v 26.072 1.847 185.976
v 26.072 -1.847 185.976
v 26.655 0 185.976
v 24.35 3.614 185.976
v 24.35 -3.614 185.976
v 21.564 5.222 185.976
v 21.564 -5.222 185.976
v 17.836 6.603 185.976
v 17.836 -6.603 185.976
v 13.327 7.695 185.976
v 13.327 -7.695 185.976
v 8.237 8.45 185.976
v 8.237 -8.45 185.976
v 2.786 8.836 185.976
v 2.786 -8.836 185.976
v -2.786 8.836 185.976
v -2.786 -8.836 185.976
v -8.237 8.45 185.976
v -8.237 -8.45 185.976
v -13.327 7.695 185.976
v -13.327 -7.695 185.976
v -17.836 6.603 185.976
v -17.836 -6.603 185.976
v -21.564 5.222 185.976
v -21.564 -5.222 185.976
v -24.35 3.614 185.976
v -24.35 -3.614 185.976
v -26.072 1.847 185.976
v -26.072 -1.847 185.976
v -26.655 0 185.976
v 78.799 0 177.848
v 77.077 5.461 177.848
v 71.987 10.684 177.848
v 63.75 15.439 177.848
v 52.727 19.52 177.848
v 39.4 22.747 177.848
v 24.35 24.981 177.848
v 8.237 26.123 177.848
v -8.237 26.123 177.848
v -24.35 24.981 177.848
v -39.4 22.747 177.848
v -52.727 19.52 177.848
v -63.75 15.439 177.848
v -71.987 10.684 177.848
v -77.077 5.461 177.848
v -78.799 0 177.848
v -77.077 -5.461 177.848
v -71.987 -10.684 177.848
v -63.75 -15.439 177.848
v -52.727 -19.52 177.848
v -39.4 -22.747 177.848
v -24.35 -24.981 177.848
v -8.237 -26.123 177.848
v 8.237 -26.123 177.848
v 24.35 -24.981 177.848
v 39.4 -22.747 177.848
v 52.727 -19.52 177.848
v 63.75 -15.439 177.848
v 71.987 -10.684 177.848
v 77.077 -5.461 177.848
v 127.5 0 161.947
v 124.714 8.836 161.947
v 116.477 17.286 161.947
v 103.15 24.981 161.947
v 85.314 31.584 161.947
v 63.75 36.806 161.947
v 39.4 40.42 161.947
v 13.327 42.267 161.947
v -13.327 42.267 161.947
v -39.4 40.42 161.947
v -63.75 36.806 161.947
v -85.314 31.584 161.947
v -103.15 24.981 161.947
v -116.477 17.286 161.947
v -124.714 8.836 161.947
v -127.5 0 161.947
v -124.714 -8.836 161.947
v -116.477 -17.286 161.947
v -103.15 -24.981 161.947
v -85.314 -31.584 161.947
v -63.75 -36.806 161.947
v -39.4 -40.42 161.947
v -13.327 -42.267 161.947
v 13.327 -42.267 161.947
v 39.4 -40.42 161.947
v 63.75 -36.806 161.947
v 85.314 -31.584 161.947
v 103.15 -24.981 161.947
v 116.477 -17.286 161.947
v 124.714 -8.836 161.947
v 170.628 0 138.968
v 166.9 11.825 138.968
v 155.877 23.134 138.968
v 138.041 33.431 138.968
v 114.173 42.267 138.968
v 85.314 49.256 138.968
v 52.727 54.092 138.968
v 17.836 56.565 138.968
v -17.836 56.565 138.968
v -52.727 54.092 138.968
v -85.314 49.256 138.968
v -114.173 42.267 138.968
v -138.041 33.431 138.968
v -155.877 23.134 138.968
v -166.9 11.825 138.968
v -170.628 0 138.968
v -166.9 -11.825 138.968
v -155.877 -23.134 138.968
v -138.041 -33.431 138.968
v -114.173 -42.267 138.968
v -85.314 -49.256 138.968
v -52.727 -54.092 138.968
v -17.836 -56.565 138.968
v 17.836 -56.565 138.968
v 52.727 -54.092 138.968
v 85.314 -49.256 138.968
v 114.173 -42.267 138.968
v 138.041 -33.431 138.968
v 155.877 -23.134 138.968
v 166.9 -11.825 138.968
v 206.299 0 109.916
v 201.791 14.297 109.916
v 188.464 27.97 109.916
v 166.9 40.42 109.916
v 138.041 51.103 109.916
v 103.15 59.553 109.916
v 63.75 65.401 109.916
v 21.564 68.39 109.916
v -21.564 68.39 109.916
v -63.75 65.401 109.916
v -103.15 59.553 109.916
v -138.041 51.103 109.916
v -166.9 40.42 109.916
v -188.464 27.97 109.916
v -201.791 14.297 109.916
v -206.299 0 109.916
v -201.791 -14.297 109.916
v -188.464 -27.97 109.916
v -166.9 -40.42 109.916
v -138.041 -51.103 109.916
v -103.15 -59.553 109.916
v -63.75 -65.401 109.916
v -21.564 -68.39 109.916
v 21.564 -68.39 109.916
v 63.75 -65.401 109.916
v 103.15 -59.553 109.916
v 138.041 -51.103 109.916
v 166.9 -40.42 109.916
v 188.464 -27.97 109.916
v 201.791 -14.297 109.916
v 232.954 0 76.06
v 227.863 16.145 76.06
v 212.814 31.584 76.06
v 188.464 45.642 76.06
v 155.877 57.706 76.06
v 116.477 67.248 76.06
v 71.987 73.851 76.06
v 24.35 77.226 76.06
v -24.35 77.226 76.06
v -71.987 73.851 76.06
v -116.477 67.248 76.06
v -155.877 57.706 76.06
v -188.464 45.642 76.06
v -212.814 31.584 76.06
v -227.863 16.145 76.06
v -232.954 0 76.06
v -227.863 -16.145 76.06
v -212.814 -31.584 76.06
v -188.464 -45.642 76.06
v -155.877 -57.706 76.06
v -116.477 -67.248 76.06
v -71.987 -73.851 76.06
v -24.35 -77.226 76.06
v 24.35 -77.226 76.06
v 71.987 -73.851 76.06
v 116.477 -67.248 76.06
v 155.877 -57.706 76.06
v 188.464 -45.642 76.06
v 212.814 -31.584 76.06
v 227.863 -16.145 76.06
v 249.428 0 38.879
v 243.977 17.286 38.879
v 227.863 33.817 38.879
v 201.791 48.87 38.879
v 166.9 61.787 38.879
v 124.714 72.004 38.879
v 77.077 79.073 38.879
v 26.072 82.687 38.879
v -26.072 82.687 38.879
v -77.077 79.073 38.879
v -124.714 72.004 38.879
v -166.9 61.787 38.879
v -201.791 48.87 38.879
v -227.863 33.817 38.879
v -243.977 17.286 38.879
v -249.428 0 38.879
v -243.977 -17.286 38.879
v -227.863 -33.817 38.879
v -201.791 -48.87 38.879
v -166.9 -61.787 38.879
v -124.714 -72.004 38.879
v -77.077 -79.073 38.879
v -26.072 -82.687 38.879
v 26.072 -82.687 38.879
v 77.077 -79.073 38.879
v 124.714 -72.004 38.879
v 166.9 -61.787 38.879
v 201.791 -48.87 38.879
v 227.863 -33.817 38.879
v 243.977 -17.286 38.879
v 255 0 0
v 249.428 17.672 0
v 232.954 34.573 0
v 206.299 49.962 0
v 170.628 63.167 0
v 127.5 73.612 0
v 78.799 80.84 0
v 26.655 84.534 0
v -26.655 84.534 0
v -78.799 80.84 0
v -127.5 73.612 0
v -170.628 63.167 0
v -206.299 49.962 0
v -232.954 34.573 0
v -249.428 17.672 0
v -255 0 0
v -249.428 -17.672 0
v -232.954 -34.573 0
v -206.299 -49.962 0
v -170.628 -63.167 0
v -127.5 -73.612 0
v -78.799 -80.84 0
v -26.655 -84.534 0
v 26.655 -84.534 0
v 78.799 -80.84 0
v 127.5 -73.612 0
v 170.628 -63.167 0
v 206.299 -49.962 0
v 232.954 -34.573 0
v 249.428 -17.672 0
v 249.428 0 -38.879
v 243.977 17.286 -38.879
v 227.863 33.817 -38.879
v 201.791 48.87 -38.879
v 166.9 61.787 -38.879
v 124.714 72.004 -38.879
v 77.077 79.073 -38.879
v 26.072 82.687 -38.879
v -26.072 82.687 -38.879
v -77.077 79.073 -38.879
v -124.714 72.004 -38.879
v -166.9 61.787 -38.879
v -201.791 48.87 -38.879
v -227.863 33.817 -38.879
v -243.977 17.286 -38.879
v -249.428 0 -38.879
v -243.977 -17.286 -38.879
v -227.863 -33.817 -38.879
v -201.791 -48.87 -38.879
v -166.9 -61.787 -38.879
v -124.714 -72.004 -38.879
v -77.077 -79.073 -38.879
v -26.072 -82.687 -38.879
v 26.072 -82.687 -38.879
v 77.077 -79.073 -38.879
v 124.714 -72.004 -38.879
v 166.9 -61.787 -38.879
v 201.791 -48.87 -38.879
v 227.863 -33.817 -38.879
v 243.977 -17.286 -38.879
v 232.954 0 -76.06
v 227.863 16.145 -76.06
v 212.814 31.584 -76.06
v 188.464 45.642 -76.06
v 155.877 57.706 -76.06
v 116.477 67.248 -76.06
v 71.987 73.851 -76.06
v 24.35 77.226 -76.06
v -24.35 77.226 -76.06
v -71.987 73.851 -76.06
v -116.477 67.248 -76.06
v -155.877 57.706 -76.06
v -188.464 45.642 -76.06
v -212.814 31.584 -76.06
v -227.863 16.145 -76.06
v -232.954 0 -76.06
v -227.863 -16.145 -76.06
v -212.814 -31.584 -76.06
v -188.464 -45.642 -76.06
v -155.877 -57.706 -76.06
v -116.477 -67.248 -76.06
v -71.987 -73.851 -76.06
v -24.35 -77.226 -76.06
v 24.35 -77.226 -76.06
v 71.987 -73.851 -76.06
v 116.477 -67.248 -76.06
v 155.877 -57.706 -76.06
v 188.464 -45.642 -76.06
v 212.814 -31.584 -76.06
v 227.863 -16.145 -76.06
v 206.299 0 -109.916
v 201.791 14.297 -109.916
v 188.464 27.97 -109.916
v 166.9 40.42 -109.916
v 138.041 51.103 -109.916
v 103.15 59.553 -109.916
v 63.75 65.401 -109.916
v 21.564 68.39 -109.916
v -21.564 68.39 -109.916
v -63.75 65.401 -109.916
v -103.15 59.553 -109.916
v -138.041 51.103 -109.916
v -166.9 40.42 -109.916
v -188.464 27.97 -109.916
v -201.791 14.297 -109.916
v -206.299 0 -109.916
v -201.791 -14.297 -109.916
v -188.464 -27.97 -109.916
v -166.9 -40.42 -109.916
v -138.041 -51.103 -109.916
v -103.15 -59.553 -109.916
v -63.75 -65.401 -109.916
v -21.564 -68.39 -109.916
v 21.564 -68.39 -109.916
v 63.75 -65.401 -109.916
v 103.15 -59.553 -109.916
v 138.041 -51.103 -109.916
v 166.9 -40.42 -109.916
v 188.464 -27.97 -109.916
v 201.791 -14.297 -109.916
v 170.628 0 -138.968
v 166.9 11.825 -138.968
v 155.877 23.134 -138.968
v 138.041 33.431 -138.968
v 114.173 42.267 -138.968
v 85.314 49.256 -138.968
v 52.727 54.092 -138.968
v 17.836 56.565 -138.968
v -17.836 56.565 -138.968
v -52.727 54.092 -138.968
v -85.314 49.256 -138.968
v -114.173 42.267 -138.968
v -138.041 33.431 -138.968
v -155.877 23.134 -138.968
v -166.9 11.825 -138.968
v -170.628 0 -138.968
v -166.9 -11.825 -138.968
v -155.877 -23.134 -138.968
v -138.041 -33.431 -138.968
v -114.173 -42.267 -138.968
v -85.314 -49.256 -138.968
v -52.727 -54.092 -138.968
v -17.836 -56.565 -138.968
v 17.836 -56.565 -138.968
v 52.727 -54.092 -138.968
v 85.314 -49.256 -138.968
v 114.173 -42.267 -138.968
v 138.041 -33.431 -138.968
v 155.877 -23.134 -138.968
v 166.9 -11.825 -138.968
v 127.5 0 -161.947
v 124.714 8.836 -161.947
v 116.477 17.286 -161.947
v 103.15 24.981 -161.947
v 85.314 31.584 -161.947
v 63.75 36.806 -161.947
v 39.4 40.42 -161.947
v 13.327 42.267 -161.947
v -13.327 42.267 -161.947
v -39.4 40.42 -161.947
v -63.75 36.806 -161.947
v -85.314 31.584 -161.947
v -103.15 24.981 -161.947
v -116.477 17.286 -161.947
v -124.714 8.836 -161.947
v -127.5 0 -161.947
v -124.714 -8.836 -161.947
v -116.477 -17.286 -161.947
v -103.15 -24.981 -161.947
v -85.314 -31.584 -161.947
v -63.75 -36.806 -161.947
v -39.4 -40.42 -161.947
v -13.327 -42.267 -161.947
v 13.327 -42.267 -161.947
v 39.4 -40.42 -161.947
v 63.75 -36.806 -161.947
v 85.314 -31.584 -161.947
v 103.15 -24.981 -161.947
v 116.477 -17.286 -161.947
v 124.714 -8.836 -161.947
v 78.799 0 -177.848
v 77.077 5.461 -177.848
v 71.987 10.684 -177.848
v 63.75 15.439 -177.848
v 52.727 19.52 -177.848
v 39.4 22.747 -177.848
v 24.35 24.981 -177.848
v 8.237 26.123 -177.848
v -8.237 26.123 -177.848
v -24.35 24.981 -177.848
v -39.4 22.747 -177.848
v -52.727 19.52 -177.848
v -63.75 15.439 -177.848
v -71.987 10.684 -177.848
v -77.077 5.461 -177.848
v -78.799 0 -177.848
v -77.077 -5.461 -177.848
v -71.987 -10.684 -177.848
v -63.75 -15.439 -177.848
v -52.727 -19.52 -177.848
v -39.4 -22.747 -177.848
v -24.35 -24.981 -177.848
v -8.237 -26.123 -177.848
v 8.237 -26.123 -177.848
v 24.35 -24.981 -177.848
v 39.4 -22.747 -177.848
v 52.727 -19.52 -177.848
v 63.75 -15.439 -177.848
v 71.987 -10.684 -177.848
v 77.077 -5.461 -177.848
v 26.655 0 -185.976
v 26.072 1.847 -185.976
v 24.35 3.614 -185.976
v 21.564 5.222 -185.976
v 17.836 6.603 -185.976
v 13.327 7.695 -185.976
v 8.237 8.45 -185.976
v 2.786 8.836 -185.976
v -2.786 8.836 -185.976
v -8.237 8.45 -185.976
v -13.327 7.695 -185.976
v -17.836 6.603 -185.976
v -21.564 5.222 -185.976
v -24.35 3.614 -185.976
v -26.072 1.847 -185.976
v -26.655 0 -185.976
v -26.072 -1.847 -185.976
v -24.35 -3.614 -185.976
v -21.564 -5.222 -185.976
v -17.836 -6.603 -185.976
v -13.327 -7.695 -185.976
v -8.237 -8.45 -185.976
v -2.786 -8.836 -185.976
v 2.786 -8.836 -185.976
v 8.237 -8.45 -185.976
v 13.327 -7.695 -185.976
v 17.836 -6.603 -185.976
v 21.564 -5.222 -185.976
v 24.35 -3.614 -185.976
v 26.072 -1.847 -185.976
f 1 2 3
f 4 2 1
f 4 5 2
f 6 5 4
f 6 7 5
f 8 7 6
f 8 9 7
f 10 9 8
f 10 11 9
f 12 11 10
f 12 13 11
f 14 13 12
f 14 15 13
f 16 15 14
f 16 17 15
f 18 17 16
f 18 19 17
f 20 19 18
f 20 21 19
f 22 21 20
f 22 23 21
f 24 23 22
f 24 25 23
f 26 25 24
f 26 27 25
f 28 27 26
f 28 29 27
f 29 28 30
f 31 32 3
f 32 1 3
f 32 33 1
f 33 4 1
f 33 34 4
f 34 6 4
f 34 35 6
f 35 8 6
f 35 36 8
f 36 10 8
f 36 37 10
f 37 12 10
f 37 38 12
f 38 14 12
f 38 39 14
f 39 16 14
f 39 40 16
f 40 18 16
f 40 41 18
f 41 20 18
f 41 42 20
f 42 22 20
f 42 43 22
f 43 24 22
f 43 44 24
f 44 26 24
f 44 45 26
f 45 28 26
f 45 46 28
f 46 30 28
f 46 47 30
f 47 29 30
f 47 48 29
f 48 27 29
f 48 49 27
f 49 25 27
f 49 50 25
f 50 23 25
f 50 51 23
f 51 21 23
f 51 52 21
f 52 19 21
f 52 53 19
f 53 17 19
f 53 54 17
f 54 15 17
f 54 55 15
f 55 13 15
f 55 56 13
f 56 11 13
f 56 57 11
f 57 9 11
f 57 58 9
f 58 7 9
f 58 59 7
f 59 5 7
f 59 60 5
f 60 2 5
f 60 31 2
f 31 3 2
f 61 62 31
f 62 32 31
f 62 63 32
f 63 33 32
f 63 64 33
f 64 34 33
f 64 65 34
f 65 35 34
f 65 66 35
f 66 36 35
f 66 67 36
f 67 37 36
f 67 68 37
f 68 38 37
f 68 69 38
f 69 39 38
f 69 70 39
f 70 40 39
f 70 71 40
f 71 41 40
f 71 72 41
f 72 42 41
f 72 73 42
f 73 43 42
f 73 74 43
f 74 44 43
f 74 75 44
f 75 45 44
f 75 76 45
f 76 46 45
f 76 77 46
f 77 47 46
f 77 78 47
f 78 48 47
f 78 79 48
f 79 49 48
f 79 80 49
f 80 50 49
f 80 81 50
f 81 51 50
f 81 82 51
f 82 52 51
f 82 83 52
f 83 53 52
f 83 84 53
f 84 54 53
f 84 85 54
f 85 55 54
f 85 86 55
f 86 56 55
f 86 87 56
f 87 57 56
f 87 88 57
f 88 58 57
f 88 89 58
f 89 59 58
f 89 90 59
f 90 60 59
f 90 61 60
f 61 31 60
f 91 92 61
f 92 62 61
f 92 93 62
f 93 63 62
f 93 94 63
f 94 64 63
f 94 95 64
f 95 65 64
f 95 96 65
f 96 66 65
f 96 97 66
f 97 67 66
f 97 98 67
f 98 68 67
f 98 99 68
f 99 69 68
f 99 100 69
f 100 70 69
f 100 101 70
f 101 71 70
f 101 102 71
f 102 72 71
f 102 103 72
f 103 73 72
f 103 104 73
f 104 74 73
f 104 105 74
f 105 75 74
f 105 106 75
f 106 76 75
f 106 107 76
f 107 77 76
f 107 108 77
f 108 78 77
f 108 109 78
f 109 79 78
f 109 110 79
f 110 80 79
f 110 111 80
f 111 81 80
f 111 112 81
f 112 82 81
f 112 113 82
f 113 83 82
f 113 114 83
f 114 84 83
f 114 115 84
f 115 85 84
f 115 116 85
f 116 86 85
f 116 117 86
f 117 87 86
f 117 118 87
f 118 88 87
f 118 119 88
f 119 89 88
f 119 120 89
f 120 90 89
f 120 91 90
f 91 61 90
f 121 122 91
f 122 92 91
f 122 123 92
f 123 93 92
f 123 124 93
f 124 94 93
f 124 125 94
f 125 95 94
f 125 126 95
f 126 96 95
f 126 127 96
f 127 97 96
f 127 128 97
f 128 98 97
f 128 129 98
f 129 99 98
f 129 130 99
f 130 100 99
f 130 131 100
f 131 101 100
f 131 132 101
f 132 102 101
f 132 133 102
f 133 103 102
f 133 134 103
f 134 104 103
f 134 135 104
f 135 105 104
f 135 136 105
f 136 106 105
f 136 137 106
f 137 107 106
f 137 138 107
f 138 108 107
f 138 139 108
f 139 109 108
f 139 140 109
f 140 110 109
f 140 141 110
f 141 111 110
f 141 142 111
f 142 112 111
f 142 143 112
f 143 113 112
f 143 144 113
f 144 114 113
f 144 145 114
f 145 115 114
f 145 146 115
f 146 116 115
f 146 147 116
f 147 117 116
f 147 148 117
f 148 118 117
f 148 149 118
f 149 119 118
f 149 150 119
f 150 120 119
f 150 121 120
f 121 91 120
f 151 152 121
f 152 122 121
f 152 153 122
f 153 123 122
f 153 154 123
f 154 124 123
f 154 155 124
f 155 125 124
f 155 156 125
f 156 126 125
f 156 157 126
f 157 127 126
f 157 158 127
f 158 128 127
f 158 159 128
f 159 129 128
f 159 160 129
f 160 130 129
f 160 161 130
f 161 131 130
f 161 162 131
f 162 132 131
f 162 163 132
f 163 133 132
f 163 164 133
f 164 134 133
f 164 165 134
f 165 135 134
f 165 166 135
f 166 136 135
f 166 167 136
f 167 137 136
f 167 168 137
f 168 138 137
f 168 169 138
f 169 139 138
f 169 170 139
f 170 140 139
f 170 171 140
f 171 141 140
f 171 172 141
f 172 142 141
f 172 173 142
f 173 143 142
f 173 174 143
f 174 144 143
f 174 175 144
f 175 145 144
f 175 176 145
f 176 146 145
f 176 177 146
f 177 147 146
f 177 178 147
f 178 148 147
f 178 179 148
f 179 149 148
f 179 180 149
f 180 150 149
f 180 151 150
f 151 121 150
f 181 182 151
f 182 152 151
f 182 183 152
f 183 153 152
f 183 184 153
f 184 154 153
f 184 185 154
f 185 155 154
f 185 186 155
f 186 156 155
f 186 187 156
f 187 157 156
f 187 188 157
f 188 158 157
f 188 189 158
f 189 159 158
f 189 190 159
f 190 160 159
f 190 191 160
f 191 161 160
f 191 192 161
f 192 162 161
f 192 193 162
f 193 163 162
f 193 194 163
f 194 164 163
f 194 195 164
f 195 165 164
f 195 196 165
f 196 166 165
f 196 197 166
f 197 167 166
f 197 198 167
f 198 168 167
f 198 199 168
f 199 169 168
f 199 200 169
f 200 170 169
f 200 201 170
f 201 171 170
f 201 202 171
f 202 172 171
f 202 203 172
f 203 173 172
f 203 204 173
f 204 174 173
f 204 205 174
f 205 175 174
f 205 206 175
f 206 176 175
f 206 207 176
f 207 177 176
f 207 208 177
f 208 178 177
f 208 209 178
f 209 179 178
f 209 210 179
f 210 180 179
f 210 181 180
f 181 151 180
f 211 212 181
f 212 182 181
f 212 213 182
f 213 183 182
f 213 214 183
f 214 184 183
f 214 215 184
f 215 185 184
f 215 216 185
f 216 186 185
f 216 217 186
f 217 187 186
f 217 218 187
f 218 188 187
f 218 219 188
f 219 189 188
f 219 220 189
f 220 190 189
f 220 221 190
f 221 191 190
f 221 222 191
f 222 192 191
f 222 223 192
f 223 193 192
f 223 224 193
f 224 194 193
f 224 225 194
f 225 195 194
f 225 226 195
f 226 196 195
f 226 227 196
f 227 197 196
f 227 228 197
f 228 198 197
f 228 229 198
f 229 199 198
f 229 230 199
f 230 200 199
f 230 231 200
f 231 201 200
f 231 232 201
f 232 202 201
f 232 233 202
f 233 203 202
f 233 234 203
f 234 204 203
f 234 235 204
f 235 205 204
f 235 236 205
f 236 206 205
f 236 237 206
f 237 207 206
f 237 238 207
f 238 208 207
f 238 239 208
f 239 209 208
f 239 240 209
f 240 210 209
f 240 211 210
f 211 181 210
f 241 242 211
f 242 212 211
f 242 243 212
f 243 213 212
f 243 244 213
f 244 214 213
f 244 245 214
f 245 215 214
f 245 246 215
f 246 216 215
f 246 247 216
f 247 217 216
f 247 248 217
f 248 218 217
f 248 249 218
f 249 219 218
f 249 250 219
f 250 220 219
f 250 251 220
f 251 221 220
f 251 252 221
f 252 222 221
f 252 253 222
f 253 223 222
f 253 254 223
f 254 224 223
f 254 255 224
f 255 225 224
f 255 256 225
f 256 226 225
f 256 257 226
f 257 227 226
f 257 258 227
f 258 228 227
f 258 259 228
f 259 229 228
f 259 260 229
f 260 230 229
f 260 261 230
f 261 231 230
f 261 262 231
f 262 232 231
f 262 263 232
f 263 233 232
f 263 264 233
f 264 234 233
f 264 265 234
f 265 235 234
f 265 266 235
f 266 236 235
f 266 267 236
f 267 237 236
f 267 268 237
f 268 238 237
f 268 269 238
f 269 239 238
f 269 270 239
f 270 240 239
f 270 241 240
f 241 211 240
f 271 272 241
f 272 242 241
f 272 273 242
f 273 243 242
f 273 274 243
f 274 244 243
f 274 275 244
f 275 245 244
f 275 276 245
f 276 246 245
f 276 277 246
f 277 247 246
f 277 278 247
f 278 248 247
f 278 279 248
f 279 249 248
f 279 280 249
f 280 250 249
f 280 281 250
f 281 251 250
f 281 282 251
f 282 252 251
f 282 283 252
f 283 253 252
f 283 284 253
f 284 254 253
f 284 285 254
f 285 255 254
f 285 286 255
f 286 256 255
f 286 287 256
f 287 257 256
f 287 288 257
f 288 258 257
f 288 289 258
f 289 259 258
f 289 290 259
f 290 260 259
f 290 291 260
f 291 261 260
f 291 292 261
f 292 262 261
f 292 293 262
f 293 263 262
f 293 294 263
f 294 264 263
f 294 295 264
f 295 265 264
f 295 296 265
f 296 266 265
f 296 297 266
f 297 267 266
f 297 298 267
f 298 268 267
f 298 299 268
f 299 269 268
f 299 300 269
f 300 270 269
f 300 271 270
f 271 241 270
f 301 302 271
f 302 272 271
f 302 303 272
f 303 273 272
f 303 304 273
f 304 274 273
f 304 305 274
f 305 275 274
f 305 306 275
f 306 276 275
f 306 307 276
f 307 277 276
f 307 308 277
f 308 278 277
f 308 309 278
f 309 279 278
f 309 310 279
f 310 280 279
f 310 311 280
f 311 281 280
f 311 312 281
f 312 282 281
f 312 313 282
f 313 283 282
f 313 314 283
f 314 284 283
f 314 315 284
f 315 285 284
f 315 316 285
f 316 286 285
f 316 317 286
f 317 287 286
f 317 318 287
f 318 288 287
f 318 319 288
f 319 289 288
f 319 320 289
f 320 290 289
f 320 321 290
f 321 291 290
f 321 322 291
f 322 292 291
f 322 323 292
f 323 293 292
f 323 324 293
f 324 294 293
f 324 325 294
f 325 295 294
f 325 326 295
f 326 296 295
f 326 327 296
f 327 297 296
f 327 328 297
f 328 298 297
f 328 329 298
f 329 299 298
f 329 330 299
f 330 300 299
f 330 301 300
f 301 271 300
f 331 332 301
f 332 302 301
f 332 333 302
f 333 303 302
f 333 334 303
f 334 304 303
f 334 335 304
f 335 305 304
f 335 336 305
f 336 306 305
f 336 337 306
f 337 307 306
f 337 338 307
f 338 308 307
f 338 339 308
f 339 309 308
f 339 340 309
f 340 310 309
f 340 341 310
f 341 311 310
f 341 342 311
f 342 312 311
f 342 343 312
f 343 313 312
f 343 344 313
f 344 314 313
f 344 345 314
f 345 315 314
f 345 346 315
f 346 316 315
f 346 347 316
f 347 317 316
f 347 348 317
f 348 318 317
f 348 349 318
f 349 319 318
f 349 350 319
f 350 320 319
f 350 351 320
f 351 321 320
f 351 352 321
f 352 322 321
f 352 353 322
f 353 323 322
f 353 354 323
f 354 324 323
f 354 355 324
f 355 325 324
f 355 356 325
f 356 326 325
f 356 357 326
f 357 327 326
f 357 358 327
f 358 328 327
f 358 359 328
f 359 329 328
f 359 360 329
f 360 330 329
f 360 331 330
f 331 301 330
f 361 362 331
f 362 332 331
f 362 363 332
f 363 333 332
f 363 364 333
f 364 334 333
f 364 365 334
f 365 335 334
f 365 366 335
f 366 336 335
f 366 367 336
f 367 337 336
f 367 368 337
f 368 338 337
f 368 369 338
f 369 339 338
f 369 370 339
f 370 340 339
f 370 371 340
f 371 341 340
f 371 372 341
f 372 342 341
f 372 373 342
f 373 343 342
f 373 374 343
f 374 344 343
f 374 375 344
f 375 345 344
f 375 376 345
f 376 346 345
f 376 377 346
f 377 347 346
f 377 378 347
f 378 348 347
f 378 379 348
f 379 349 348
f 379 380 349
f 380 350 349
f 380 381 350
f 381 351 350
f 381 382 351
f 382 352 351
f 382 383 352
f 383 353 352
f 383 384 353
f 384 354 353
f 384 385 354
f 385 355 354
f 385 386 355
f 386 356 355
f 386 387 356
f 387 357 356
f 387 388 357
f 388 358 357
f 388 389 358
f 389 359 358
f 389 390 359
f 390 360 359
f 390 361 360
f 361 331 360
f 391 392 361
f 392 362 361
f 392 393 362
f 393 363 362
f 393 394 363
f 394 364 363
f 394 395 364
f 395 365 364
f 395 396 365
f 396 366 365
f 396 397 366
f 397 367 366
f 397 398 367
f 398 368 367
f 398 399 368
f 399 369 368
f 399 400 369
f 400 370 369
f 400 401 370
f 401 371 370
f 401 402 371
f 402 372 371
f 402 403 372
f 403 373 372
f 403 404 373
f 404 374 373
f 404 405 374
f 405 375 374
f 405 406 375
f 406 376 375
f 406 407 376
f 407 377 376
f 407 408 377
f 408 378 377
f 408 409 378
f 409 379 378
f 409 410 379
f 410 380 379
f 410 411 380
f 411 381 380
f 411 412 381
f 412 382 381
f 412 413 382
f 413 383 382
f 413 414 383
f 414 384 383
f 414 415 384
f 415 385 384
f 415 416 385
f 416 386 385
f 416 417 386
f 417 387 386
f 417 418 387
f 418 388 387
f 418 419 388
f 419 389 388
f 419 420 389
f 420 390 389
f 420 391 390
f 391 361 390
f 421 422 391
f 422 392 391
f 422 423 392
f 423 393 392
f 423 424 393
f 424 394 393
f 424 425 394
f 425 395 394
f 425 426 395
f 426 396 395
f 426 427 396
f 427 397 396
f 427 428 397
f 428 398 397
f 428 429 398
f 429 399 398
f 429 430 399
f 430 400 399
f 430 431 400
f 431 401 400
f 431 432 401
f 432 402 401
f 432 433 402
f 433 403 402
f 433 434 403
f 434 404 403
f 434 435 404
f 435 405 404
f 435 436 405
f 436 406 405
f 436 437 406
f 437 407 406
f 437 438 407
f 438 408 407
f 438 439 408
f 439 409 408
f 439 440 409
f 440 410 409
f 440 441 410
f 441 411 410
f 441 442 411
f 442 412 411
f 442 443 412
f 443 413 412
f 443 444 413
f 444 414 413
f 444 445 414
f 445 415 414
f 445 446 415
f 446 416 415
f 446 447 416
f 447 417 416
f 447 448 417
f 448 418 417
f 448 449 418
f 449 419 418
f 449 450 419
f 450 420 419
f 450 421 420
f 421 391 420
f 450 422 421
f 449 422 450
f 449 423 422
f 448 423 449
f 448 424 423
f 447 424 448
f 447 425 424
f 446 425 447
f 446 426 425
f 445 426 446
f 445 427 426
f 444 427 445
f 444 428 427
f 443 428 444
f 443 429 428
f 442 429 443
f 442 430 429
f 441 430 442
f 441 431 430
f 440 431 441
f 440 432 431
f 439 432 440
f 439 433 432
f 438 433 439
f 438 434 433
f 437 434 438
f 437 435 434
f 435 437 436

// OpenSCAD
// Generated by SolidPython 1.0.1 on 2020-07-29 00:46:51


scale(v = [15, 5, 11]) {
	sphere(r = 17);
}
/***********************************************
*********      SolidPython code:      **********
************************************************
 
# import packages: SolidPython
from solid import *
from solid.utils import *
from itertools import chain, combinations, permutations


class Resize:

    def __init__(self, scad_file):
        self.scad_file = scad_file
        #self.scad_file = import_scad(scad_file)
        # cone/cylinder param:
        self.r1 = 0
        self.r2 = 0
        self.h = 0
        # rectangular prism param:
        self.w = 0
        self.l = 0
        # ellipse param:
        self.r = 0

    # import OpenScad code (file name corresponds to shape)


    # classify shape + parameters
    def assign(self, param1, param2, param3):
        if self.scad_file == 'cone.scad':
            self.r1 = param1
            self.r2 = param2
            self.h = param3
        elif self.scad_file == 'cylinder.scad':
            self.r1 = param1
            self.r2 = param2
            self.h = param3
        elif self.scad_file == 'rectangularPrism.scad':
            self.h = param1
            self.l = param2
            self.w = param3
        else:
            self.r = param1
            self.h = param2

    # resize parameters
    def iterate(self):
        x = range(3, 20, 2)
        i = 1
        if self.scad_file == 'cone.scad':
            tempList = list(permutations(x, 2))
            for temp in tempList:
                param1 = temp[0]
                param2 = temp[1]
                filepath = 'produced_scad_files/' + 'cone' + str(param1) + '_' + str(param2) + '_' + '.scad'
                scad_render_to_file(cylinder(h=param1, r1=param2, r2=0), filepath)

        elif self.scad_file == 'cylinder.scad':
            tempList = list(permutations(x, 3))
            for temp in tempList:
                param1 = temp[0]
                param2 = temp[1]
                filepath = 'produced_scad_files/' + 'cylinder' + str(param1) + '_' + str(param2) + '_' + '.scad'
                scad_render_to_file(cylinder(h=param1, r1=param2, r2=param2), filepath)

        elif self.scad_file == 'rectangularPrism.scad':
            tempList = list(permutations(x, 3))
            for temp in tempList:
                param1 = temp[0]
                param2 = temp[1]
                param3 = temp[2]
                filepath = 'produced_scad_files/' + 'rectangularPrism' + str(param1) + '_' + str(param2) + '_' + str(
                    param3) + '.scad'
                scad_render_to_file(cube(size=(param1, param2, param3)), filepath)

        elif self.scad_file == 'ellipse.scad':
            tempList = list(permutations(x, 4))
            for temp in tempList:
                param1 = temp[0]
                param2 = temp[1]
                param3 = temp[2]
                param4 = temp[3]
                filepath = 'produced_scad_files/' + 'ellipse' + str(param1) + '_' + str(param2) + '_' + str(param3) + '_' + str(param4) + '.scad'
                scad_render_to_file(scale([param1, param2, param3])(sphere(r=param4)), filepath)

    def render_to_scadfile(self):
        scad_render_to_file(scad, 'example.scad') 
 
************************************************/
